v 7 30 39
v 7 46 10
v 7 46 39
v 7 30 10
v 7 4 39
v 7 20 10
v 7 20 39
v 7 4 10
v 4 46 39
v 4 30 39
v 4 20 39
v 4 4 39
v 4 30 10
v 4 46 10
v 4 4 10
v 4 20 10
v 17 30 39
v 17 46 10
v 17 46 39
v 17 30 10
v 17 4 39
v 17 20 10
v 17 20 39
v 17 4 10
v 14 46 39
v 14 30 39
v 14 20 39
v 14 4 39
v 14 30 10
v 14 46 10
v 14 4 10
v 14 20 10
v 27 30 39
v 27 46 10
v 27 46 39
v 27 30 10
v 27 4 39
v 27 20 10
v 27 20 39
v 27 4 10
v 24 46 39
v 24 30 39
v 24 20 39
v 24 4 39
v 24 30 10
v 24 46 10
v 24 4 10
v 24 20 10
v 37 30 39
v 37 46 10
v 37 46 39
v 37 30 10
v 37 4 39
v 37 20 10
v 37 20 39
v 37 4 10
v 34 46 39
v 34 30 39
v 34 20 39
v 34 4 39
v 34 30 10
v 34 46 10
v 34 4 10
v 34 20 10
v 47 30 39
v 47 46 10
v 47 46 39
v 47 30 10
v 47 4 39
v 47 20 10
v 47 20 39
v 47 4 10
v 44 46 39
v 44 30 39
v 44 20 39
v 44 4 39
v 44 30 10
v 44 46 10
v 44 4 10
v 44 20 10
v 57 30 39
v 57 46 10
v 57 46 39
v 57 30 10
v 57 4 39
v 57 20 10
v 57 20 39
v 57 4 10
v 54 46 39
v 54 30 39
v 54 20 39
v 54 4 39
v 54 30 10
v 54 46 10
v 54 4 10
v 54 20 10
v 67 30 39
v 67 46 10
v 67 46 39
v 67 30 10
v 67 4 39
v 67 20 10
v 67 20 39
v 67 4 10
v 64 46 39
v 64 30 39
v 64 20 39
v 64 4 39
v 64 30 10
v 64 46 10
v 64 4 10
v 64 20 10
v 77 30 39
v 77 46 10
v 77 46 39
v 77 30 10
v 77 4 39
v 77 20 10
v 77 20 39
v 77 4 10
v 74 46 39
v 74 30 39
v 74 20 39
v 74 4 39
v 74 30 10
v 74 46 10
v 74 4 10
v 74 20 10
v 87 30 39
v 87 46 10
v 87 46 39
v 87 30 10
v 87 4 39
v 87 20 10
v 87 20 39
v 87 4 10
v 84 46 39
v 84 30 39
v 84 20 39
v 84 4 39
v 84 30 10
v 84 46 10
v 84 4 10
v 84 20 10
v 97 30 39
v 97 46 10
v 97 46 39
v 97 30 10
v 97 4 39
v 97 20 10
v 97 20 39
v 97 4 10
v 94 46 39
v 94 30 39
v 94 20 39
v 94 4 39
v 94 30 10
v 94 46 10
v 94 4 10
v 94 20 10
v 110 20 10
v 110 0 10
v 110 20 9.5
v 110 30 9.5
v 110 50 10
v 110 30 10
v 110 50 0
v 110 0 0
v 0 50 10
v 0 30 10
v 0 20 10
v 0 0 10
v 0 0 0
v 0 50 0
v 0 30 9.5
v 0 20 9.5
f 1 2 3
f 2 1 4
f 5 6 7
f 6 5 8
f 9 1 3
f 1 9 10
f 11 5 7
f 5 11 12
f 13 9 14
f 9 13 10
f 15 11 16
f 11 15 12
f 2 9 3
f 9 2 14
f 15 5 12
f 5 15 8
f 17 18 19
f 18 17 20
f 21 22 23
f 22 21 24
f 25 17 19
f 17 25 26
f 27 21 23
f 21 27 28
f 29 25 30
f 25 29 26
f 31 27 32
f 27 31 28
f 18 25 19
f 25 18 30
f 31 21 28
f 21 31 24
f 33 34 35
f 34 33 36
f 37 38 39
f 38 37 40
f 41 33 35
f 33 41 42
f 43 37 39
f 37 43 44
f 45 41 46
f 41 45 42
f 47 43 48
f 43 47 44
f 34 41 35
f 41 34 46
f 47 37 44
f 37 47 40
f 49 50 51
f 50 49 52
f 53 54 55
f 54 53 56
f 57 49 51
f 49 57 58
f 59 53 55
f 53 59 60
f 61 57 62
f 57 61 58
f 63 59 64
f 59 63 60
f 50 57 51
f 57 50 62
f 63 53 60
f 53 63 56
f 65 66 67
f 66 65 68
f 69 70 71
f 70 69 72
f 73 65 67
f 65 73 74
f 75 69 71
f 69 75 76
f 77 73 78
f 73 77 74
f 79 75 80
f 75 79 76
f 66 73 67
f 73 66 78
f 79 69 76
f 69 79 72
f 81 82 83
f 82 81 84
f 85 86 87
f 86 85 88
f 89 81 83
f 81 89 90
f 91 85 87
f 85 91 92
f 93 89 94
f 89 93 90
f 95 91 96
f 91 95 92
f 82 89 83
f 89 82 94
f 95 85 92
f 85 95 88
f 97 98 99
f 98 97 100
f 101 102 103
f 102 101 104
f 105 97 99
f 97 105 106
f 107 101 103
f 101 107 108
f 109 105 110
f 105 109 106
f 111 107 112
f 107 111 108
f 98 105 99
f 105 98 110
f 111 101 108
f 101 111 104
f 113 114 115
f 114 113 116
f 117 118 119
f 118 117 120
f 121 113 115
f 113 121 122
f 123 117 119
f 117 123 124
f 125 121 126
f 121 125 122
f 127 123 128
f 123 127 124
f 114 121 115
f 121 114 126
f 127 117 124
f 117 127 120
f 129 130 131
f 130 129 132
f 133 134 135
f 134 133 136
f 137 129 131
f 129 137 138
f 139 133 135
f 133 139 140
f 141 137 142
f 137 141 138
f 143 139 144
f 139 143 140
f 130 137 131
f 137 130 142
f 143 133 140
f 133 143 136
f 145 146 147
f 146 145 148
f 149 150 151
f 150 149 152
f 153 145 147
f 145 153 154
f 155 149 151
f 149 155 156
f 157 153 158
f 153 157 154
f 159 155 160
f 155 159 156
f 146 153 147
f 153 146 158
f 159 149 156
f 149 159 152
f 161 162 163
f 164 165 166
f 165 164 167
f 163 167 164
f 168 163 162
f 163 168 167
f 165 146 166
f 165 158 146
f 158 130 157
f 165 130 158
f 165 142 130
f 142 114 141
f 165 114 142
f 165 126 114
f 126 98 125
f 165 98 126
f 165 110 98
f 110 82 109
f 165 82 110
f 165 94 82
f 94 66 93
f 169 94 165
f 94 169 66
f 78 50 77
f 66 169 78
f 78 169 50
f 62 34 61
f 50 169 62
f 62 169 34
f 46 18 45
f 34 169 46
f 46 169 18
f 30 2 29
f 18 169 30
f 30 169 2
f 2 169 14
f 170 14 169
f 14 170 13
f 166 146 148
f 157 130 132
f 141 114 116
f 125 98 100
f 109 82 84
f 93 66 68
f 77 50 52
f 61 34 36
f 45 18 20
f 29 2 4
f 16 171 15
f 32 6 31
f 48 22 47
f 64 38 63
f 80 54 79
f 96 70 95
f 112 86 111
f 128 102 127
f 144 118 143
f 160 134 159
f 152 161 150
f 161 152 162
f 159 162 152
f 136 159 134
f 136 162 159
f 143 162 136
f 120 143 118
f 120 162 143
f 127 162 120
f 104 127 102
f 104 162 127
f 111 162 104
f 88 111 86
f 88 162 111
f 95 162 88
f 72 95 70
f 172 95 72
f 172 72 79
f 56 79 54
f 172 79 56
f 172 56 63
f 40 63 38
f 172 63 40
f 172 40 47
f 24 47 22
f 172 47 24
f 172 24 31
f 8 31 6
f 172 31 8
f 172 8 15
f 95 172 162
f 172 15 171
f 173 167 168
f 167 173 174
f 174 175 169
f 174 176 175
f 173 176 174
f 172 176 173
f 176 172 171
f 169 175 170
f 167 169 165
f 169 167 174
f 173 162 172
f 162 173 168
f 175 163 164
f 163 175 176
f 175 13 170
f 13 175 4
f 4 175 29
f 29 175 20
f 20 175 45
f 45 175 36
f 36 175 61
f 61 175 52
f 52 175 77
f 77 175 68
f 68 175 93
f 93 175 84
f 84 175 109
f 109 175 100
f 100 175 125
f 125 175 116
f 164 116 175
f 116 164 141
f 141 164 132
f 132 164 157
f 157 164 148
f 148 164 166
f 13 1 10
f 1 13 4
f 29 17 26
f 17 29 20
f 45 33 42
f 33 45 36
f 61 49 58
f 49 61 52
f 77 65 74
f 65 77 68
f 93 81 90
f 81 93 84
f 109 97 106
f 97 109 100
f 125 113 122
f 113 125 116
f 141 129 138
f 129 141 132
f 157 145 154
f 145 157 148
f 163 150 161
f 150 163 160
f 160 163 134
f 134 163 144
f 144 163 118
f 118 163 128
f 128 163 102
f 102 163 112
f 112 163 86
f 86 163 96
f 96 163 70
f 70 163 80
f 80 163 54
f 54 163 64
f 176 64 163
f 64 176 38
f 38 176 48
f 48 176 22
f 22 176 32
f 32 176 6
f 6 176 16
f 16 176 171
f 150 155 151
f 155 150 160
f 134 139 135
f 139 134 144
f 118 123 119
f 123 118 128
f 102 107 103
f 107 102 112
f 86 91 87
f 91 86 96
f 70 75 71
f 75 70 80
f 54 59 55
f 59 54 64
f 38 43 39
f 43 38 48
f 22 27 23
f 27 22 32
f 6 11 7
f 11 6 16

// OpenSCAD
$fn = 32;

// ----------------------------------------------------------------------
// Heatsink: slotted fin block
// ----------------------------------------------------------------------

// --- parameters (mm) ---
base_l = 110;             // base length, X
base_w = 50;              // base width, Y
base_t = 10;              // base plate thickness
fin_h = 30;               // fin height above the base
fin_t = 3;                // fin thickness
edge = 4;                 // margin from the base ends
pitch = 10;               // fin pitch
slot_w = 10;              // central slot width, Y

n_fins = floor((base_l - 2 * edge - fin_t) / pitch) + 1;  // fin count
total_h = base_t + fin_h - 1;  // overall height

difference() {
union() {
  cube([base_l, base_w, base_t]);
  for (i = [0 : n_fins - 1])
    translate([edge + i * pitch, edge, base_t - 1])
      cube([fin_t, base_w - 2 * edge, fin_h]);
}
  translate([-1, base_w / 2 - slot_w / 2, base_t - 0.5])
    cube([base_l + 2, slot_w, fin_h + 2]);
}
